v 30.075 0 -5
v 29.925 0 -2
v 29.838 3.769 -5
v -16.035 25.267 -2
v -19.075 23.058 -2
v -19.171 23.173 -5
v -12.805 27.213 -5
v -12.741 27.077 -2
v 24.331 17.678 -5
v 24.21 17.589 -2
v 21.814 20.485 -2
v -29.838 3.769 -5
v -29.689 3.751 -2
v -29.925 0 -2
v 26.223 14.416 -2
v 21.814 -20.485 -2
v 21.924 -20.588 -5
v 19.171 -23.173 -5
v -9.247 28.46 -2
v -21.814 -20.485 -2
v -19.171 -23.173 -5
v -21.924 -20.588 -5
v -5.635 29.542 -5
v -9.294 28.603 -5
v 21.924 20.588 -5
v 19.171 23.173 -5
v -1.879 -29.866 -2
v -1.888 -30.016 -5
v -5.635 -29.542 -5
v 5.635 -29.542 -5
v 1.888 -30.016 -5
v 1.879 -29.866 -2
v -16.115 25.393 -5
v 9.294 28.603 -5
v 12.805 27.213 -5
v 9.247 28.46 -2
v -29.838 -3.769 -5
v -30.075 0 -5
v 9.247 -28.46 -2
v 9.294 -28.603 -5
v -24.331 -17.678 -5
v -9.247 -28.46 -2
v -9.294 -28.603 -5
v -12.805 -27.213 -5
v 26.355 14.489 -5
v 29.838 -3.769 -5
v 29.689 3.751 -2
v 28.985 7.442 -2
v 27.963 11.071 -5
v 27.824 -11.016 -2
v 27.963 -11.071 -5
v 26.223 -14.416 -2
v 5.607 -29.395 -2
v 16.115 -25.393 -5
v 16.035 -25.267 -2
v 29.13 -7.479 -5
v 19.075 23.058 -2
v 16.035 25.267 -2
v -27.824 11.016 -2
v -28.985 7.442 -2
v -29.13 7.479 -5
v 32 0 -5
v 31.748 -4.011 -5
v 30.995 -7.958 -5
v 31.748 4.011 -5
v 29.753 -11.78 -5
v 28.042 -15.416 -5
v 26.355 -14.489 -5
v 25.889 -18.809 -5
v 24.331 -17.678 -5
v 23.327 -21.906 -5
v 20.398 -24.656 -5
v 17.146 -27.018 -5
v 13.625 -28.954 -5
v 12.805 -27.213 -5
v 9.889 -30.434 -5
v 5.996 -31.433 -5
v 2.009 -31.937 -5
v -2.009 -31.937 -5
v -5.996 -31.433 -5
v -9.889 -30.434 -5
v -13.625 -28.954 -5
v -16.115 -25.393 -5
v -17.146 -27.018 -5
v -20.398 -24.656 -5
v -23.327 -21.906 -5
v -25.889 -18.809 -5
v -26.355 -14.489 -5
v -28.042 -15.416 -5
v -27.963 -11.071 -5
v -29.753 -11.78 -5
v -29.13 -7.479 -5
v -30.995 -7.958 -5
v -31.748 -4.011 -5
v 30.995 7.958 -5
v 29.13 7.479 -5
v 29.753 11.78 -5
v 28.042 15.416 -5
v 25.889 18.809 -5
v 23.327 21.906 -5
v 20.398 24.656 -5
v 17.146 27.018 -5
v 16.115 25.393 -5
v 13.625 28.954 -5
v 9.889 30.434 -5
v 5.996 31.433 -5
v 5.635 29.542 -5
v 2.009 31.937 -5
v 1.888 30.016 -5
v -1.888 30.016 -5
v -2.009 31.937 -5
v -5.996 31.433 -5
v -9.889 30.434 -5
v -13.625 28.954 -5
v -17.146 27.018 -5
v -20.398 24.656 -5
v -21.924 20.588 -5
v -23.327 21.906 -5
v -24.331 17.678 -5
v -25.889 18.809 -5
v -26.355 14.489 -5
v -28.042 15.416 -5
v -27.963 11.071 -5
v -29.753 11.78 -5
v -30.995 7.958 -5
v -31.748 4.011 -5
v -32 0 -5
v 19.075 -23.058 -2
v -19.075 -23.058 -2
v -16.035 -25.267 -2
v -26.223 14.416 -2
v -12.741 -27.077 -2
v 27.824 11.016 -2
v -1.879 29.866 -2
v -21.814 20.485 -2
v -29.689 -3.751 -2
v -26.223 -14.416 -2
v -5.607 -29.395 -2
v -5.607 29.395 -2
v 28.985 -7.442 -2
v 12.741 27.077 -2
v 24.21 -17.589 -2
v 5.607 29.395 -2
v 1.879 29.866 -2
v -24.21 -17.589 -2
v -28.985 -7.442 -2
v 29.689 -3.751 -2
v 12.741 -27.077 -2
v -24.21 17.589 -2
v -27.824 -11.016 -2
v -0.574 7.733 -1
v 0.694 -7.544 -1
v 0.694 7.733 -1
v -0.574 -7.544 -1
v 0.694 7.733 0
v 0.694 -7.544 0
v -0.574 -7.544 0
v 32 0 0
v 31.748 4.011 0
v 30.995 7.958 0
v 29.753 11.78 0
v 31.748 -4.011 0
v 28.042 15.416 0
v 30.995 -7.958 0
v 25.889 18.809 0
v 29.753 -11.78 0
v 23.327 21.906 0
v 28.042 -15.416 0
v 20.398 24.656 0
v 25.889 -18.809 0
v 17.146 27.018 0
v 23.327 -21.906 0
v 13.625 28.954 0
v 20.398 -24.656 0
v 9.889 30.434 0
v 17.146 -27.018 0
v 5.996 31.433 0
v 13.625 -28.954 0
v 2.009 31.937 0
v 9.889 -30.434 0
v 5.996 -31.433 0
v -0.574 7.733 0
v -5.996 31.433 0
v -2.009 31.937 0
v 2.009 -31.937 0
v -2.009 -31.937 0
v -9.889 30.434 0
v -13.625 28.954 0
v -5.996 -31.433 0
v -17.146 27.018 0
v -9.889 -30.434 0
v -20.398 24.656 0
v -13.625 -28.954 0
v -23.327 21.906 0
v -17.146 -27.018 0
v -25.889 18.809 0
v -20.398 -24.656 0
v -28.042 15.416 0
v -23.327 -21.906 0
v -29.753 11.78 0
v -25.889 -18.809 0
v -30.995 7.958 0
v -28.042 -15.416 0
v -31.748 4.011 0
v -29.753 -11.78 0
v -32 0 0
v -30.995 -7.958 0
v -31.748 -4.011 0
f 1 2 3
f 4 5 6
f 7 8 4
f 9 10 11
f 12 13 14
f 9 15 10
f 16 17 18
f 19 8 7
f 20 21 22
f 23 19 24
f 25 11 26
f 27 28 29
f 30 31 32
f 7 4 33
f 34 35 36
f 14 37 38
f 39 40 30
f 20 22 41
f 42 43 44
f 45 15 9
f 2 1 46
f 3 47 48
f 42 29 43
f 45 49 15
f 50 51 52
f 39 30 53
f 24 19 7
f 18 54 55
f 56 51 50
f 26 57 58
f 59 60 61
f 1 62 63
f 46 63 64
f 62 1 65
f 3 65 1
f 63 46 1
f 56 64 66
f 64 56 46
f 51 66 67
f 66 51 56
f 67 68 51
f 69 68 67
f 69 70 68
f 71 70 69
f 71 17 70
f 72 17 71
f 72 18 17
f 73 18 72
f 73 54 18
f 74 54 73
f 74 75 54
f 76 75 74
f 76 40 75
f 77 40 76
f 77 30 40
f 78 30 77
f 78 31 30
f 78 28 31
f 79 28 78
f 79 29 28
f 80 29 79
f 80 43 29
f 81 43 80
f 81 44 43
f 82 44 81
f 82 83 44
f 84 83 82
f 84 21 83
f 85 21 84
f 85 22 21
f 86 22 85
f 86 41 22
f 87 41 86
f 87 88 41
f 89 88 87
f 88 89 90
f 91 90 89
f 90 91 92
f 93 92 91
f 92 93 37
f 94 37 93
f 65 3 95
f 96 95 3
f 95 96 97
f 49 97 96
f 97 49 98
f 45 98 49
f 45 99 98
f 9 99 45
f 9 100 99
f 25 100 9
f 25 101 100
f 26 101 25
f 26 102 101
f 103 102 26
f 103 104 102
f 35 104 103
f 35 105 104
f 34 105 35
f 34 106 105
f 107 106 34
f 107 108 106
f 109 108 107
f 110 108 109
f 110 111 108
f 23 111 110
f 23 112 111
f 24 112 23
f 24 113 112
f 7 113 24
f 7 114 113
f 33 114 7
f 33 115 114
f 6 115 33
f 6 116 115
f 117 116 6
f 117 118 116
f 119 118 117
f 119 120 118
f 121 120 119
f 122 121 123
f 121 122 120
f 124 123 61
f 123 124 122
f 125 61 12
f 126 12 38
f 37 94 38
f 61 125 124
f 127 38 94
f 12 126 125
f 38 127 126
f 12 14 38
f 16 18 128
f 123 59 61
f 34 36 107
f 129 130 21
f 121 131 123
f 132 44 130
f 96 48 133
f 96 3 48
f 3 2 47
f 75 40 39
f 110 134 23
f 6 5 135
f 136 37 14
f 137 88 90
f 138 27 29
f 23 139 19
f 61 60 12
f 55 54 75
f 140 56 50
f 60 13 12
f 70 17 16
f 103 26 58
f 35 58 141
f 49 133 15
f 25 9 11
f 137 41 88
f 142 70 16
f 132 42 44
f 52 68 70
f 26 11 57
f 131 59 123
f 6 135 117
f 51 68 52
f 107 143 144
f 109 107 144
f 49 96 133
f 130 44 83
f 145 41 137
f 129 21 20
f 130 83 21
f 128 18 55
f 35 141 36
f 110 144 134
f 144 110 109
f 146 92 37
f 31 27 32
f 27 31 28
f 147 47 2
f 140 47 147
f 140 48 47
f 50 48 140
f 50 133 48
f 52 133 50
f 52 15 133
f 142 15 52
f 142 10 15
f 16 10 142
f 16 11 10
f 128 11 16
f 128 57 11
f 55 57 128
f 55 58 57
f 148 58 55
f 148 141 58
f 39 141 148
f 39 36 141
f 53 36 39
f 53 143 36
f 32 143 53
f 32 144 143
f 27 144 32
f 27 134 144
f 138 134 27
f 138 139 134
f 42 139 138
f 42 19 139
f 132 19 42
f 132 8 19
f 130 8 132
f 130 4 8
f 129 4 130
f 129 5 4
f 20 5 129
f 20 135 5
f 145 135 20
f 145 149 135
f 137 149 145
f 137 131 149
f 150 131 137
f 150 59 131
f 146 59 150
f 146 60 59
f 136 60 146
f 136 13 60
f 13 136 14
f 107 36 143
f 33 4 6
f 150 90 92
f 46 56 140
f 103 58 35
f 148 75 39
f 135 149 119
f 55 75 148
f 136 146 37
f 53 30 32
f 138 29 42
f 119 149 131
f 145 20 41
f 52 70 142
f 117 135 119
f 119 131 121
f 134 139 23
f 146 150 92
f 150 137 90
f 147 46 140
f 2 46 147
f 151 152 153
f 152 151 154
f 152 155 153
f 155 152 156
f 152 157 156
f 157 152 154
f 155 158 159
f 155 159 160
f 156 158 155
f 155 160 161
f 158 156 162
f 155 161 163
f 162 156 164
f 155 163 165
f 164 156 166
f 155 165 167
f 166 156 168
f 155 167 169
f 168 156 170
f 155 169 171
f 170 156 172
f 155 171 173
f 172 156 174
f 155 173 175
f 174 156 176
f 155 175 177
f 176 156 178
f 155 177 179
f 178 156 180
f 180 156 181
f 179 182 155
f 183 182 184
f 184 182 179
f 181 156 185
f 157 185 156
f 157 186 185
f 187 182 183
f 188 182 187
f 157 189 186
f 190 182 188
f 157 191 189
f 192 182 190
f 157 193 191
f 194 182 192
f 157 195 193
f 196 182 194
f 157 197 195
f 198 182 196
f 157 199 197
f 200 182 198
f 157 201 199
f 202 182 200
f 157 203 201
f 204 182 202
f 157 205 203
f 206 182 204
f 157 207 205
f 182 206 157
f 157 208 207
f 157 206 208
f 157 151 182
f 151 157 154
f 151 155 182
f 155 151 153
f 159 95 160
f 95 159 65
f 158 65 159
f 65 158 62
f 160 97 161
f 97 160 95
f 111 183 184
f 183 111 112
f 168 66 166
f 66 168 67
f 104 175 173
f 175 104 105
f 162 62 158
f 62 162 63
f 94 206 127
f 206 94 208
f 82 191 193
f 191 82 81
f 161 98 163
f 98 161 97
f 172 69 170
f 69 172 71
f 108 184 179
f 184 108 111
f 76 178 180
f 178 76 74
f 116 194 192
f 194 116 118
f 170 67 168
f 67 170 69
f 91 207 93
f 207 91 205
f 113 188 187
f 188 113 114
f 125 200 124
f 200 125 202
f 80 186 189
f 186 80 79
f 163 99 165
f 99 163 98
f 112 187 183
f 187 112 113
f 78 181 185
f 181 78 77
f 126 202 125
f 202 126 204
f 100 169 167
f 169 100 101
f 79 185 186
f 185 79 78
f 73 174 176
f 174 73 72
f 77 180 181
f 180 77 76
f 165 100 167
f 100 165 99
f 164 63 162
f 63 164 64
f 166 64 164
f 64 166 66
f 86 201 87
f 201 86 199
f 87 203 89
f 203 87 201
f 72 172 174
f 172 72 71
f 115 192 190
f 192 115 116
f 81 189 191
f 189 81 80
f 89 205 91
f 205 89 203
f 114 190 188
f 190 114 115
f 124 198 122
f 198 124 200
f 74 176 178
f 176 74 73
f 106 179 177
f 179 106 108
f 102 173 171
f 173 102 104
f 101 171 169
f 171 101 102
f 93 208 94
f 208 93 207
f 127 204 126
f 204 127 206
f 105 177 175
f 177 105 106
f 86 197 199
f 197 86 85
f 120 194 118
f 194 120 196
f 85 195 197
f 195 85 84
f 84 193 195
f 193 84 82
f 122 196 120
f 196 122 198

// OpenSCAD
$fn = 50;


difference() {
	union() {
		translate(v = [0, 0, -5.0000000000]) {
			cylinder(h = 5, r = 32.0000000000);
		}
	}
	union() {
		#translate(v = [0, 0, -5.0000000000]) {
			cylinder(h = 3, r1 = 30.0750000000, r2 = 29.9250000000);
		}
		translate(v = [0, 0, -1]) {
			linear_extrude(height = 1) {
				text(font = "Wingdings", halign = "center", size = 11, text = "|", valign = "center");
			}
		}
	}
}
